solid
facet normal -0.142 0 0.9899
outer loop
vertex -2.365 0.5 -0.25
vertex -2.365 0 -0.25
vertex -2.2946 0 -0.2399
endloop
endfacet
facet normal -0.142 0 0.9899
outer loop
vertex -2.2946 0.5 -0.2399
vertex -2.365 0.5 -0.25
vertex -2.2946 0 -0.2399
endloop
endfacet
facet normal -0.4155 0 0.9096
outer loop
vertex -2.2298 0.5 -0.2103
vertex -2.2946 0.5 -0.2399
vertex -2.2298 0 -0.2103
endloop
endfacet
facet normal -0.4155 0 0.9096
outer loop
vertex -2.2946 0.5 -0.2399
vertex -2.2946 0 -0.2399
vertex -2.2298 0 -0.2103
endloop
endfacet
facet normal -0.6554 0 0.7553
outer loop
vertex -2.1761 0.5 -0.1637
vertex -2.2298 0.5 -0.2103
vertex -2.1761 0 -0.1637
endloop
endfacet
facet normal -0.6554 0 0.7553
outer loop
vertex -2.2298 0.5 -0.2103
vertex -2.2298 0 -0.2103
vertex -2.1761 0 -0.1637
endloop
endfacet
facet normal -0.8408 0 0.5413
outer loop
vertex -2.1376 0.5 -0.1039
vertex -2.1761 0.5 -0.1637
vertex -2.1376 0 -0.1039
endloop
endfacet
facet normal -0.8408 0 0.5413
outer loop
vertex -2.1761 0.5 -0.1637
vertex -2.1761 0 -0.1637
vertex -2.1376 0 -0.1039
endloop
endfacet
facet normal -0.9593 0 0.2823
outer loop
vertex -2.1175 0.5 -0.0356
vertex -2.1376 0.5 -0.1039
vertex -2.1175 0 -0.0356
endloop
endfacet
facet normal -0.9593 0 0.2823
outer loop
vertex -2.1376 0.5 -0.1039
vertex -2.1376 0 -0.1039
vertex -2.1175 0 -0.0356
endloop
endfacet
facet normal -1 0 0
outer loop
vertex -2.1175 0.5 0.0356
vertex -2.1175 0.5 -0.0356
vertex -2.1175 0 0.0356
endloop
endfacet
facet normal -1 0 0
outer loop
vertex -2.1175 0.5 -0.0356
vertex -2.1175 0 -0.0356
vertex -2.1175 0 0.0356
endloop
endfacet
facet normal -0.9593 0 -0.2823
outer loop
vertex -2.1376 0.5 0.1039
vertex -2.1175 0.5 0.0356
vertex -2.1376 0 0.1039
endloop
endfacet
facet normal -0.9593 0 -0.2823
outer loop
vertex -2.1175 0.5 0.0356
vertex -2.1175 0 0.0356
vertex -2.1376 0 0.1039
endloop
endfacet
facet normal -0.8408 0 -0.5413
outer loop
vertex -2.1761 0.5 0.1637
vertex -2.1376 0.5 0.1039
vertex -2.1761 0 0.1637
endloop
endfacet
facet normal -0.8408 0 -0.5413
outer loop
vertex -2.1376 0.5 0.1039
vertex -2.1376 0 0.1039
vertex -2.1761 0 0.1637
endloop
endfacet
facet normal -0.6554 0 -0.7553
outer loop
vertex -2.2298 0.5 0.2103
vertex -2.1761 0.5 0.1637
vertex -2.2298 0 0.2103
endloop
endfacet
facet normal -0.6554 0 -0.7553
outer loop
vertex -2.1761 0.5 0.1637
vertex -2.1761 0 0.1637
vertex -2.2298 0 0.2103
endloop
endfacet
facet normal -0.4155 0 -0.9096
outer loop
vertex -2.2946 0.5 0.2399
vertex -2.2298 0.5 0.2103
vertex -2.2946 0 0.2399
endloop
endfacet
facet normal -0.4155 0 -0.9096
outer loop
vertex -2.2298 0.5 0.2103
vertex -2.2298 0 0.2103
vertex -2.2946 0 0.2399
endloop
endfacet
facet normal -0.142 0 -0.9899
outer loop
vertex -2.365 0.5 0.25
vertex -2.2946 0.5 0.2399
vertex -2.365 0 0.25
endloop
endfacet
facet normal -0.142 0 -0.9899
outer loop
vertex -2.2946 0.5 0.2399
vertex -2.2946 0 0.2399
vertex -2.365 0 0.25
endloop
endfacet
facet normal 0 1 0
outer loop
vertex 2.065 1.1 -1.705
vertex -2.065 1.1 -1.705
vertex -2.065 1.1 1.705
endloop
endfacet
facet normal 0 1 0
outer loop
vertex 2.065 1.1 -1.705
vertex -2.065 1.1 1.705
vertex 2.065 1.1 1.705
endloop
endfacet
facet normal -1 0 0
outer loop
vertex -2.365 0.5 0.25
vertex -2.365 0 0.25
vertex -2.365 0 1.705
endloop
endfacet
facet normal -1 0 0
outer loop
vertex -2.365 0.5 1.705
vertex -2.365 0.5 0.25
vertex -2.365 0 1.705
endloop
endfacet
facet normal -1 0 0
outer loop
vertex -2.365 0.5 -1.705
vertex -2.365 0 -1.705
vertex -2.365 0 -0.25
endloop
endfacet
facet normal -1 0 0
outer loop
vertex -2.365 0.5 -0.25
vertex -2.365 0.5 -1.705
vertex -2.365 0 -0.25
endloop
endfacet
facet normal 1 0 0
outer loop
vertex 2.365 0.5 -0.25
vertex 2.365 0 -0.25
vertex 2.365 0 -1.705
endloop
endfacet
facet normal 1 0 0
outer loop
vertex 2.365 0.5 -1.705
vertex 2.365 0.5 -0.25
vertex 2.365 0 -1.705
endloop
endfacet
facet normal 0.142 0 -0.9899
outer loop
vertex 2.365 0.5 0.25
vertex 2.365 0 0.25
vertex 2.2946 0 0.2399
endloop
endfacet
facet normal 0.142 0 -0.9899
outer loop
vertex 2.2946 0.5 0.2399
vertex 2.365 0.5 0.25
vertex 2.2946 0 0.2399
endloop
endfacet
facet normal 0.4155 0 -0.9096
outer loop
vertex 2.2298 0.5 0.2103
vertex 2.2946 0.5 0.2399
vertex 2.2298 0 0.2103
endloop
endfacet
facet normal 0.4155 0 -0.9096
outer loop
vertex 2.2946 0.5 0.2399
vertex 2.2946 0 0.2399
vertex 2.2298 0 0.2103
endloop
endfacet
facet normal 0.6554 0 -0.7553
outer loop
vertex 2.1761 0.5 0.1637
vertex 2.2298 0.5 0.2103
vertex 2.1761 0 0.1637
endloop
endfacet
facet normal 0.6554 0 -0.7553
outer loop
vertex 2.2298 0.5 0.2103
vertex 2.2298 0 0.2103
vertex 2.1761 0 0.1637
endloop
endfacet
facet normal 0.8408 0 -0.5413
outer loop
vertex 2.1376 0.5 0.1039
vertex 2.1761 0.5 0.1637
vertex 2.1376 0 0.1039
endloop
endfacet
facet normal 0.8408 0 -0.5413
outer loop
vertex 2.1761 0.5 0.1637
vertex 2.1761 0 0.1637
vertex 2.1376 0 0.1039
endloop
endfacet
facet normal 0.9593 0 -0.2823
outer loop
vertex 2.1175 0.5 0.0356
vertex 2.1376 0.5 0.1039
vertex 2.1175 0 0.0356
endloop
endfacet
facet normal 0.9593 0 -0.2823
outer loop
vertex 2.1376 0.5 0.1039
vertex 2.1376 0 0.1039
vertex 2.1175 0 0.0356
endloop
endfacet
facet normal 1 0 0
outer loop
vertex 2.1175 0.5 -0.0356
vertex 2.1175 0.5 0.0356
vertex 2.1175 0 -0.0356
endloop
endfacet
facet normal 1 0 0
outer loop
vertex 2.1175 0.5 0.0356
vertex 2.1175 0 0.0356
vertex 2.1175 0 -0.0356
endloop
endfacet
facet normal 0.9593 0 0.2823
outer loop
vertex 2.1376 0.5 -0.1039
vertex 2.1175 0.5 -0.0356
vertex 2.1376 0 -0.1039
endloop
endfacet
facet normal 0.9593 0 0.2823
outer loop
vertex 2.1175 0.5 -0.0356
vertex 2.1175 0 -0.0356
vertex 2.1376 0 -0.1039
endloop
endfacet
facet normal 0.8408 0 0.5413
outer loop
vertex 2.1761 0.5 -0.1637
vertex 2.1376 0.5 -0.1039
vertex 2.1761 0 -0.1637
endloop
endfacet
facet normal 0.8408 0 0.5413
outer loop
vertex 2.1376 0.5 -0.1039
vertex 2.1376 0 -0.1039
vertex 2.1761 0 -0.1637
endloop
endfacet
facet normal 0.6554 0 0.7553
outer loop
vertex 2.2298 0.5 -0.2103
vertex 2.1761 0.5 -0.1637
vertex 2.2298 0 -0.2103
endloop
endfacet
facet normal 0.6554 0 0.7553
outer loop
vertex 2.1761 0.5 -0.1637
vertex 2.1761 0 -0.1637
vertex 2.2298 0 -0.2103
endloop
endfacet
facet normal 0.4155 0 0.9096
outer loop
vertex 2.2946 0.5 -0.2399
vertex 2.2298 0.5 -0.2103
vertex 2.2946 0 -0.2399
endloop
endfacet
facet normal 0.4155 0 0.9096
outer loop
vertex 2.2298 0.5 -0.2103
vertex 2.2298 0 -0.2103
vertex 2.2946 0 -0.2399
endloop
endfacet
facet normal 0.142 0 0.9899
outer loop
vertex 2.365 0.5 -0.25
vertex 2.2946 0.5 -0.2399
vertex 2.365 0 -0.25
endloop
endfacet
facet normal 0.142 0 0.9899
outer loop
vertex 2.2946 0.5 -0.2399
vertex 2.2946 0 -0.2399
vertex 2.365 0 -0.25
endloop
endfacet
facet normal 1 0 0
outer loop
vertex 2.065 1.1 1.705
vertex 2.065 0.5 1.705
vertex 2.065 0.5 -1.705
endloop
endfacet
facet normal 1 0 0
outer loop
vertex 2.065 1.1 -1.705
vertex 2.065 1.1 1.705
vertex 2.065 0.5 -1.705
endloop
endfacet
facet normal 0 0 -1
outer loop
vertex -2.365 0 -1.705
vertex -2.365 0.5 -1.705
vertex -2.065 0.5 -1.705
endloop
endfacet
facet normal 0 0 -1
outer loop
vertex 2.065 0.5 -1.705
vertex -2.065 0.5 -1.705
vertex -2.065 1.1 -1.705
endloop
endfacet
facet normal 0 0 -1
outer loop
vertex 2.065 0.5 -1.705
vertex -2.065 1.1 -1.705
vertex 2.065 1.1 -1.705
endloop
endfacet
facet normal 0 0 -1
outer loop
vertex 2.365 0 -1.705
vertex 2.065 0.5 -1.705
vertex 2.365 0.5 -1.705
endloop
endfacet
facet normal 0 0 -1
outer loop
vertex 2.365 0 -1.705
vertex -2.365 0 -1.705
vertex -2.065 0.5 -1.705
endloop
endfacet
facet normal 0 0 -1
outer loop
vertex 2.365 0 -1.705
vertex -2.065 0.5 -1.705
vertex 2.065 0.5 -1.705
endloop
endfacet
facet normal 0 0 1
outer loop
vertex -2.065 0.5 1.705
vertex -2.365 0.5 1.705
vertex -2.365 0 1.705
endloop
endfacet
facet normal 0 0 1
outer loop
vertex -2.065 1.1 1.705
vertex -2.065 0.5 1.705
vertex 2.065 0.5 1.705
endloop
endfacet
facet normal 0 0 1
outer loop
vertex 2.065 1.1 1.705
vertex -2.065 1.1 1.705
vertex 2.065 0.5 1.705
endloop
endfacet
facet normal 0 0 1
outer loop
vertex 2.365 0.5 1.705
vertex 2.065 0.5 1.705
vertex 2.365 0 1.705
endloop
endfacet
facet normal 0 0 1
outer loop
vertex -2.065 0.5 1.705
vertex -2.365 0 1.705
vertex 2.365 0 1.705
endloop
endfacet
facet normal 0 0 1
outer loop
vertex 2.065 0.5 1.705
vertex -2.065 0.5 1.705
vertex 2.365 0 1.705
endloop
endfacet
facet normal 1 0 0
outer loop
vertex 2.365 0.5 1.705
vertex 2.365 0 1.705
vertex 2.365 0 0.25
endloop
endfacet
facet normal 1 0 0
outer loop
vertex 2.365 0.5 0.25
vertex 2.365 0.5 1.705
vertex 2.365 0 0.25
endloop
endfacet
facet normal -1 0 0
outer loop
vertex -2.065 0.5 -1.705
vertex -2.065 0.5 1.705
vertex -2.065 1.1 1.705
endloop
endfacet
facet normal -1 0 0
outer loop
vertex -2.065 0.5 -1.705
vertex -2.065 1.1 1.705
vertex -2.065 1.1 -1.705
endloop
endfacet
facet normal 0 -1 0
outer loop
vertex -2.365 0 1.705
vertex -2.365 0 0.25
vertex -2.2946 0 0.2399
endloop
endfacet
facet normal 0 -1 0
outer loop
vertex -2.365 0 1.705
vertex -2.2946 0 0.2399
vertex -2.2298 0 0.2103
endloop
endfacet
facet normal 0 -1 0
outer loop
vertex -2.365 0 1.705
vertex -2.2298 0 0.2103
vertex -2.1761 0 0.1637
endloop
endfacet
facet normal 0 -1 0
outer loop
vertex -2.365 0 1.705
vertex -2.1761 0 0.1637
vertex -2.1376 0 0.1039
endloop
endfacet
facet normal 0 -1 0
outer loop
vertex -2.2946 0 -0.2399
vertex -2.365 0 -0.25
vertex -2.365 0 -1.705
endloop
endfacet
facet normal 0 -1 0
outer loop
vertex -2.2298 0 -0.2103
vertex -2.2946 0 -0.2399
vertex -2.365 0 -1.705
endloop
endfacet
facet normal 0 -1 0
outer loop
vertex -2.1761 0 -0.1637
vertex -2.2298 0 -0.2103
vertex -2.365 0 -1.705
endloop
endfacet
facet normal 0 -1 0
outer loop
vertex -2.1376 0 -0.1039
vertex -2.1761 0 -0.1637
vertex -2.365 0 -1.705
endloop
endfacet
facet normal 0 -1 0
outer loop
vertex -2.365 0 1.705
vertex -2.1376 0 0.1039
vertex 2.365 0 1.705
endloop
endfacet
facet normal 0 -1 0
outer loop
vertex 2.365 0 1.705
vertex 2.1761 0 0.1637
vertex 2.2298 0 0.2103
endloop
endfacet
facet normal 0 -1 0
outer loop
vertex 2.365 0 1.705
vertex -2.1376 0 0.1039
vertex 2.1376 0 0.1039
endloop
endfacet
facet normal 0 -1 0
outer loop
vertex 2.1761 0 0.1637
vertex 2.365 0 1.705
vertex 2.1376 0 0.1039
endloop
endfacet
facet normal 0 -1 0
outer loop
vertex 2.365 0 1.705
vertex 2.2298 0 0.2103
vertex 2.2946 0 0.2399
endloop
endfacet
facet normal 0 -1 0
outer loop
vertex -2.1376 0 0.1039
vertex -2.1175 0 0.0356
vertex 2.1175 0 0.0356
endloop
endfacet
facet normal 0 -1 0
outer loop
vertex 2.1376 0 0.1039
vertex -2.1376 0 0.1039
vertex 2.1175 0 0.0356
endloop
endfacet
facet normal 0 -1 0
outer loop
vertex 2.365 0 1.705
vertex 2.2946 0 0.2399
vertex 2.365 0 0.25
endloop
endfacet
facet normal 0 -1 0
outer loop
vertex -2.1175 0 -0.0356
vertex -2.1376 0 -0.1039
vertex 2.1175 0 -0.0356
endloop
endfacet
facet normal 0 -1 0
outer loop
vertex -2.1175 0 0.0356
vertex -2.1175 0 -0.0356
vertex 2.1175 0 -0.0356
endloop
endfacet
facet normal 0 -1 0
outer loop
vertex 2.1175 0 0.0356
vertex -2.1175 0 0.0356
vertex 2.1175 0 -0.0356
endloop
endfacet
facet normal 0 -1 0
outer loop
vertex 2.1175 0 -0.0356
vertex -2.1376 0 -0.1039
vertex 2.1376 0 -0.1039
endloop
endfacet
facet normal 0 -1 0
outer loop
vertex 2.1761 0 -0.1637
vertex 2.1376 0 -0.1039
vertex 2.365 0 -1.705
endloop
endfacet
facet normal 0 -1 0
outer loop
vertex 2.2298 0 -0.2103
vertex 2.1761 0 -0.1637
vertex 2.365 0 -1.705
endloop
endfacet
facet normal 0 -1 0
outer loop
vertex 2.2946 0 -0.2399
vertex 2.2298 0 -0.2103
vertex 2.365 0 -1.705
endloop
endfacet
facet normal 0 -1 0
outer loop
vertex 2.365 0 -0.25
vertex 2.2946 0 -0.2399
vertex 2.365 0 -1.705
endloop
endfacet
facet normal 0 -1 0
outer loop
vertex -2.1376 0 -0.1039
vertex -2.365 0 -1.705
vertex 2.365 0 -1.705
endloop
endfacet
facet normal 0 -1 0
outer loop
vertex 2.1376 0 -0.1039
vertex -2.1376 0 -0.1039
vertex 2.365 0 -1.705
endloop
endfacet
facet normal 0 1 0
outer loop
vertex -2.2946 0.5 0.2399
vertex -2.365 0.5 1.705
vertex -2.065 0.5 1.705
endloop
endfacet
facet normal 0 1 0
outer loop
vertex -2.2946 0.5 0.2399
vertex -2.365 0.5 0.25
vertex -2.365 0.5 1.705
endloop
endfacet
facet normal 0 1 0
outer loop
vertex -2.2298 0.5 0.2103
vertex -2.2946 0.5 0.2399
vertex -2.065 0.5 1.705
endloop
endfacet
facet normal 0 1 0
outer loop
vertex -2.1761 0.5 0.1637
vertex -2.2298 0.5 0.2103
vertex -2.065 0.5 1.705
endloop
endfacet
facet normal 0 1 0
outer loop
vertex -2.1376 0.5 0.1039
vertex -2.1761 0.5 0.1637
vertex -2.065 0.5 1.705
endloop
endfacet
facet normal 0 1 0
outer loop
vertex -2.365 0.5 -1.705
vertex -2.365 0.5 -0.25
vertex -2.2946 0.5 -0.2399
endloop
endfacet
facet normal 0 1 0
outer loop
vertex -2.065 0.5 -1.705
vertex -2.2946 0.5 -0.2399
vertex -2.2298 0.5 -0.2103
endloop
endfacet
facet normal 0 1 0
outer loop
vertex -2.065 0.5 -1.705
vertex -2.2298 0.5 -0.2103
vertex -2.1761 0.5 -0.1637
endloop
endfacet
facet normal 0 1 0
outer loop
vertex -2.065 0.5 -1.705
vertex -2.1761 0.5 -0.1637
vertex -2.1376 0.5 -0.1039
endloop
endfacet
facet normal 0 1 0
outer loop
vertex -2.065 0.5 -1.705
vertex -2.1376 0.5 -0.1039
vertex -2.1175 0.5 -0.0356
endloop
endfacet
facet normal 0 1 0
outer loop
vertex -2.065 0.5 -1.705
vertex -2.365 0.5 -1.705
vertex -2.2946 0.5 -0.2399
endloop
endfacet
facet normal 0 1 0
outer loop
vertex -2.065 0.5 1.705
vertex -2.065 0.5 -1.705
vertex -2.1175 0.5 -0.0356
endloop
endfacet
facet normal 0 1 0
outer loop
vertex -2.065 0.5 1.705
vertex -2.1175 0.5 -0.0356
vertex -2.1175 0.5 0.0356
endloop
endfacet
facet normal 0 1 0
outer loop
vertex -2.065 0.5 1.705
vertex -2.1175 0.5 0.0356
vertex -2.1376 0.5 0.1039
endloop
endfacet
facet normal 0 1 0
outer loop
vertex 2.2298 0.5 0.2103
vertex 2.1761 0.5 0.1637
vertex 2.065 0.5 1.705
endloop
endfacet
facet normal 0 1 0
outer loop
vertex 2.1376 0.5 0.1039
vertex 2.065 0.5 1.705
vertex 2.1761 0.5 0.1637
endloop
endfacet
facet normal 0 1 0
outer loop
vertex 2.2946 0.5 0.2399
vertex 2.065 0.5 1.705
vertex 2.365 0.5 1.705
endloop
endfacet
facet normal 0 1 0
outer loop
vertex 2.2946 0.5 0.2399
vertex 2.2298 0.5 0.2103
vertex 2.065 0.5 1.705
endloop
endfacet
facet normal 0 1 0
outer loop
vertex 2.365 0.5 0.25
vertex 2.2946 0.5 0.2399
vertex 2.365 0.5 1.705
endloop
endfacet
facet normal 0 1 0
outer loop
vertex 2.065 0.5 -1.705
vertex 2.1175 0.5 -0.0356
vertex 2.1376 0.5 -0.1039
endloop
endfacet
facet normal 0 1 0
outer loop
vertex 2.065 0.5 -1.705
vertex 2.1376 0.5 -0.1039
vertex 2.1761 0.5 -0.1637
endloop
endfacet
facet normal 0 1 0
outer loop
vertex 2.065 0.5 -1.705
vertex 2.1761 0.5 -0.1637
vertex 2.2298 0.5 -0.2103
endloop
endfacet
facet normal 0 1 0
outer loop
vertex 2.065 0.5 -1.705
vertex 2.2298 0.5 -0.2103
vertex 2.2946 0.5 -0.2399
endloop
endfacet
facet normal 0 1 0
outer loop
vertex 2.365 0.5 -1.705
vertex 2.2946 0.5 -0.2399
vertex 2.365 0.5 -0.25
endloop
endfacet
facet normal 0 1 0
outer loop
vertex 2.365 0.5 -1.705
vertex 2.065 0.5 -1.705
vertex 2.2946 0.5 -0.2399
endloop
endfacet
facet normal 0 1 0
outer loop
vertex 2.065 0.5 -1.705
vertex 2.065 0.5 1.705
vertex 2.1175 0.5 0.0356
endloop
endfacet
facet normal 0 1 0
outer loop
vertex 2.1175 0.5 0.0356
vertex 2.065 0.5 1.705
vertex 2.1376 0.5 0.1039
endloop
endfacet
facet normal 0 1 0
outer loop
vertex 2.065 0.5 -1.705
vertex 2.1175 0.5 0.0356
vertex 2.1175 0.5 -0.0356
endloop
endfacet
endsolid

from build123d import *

# Parameters (mm, degrees)
EXTRUDE_1_DEPTH   = 0.5
EXTRUDE_1_2_DEPTH = 0.5
SKETCH_2_W        = 4.13
SKETCH_2_H        = 3.41
EXTRUDE_2_DEPTH   = 1.1


with BuildPart() as part:
    # 草图1 → 凸台-拉伸1 (new body)
    with BuildSketch(Plane(origin=(0, 0, 0), x_dir=(1, 0, 0), z_dir=(0, 1, 0))):
        with BuildLine():
            Line((-2.365, -1.705), (-2.065, -1.705))
            Line((-2.065, -1.705), (-2.065, 1.705))
            Line((-2.065, 1.705), (-2.365, 1.705))
            Line((-2.365, 1.705), (-2.365, 0.25))
            ThreePointArc((-2.365, 0.25), (-2.115, 0), (-2.365, -0.25))
            Line((-2.365, -0.25), (-2.365, -1.705))
        make_face()
    extrude(amount=EXTRUDE_1_DEPTH)



with BuildPart() as body_2:
    # 草图1 → Extrude 1 2 (new body)
    with BuildSketch(Plane(origin=(0, 0, 0), x_dir=(1, 0, 0), z_dir=(0, 1, 0))):
        with BuildLine():
            Line((2.365, -1.705), (2.365, -0.25))
            ThreePointArc((2.365, -0.25), (2.115, 0), (2.365, 0.25))
            Line((2.365, 0.25), (2.365, 1.705))
            Line((2.365, 1.705), (2.065, 1.705))
            Line((2.065, 1.705), (2.065, -1.705))
            Line((2.065, -1.705), (2.365, -1.705))
        make_face()
    extrude(amount=EXTRUDE_1_2_DEPTH)


with BuildPart() as part_1:
    add(part.part)

    add(body_2.part)  # 凸台-拉伸2 merges body 2
    # 草图2 → 凸台-拉伸2 (add)
    with BuildSketch(Plane(origin=(0, 0, 0), x_dir=(1, 0, 0), z_dir=(0, 1, 0))):
        Rectangle(SKETCH_2_W, SKETCH_2_H)
    extrude(amount=EXTRUDE_2_DEPTH)


solid = part_1.part
